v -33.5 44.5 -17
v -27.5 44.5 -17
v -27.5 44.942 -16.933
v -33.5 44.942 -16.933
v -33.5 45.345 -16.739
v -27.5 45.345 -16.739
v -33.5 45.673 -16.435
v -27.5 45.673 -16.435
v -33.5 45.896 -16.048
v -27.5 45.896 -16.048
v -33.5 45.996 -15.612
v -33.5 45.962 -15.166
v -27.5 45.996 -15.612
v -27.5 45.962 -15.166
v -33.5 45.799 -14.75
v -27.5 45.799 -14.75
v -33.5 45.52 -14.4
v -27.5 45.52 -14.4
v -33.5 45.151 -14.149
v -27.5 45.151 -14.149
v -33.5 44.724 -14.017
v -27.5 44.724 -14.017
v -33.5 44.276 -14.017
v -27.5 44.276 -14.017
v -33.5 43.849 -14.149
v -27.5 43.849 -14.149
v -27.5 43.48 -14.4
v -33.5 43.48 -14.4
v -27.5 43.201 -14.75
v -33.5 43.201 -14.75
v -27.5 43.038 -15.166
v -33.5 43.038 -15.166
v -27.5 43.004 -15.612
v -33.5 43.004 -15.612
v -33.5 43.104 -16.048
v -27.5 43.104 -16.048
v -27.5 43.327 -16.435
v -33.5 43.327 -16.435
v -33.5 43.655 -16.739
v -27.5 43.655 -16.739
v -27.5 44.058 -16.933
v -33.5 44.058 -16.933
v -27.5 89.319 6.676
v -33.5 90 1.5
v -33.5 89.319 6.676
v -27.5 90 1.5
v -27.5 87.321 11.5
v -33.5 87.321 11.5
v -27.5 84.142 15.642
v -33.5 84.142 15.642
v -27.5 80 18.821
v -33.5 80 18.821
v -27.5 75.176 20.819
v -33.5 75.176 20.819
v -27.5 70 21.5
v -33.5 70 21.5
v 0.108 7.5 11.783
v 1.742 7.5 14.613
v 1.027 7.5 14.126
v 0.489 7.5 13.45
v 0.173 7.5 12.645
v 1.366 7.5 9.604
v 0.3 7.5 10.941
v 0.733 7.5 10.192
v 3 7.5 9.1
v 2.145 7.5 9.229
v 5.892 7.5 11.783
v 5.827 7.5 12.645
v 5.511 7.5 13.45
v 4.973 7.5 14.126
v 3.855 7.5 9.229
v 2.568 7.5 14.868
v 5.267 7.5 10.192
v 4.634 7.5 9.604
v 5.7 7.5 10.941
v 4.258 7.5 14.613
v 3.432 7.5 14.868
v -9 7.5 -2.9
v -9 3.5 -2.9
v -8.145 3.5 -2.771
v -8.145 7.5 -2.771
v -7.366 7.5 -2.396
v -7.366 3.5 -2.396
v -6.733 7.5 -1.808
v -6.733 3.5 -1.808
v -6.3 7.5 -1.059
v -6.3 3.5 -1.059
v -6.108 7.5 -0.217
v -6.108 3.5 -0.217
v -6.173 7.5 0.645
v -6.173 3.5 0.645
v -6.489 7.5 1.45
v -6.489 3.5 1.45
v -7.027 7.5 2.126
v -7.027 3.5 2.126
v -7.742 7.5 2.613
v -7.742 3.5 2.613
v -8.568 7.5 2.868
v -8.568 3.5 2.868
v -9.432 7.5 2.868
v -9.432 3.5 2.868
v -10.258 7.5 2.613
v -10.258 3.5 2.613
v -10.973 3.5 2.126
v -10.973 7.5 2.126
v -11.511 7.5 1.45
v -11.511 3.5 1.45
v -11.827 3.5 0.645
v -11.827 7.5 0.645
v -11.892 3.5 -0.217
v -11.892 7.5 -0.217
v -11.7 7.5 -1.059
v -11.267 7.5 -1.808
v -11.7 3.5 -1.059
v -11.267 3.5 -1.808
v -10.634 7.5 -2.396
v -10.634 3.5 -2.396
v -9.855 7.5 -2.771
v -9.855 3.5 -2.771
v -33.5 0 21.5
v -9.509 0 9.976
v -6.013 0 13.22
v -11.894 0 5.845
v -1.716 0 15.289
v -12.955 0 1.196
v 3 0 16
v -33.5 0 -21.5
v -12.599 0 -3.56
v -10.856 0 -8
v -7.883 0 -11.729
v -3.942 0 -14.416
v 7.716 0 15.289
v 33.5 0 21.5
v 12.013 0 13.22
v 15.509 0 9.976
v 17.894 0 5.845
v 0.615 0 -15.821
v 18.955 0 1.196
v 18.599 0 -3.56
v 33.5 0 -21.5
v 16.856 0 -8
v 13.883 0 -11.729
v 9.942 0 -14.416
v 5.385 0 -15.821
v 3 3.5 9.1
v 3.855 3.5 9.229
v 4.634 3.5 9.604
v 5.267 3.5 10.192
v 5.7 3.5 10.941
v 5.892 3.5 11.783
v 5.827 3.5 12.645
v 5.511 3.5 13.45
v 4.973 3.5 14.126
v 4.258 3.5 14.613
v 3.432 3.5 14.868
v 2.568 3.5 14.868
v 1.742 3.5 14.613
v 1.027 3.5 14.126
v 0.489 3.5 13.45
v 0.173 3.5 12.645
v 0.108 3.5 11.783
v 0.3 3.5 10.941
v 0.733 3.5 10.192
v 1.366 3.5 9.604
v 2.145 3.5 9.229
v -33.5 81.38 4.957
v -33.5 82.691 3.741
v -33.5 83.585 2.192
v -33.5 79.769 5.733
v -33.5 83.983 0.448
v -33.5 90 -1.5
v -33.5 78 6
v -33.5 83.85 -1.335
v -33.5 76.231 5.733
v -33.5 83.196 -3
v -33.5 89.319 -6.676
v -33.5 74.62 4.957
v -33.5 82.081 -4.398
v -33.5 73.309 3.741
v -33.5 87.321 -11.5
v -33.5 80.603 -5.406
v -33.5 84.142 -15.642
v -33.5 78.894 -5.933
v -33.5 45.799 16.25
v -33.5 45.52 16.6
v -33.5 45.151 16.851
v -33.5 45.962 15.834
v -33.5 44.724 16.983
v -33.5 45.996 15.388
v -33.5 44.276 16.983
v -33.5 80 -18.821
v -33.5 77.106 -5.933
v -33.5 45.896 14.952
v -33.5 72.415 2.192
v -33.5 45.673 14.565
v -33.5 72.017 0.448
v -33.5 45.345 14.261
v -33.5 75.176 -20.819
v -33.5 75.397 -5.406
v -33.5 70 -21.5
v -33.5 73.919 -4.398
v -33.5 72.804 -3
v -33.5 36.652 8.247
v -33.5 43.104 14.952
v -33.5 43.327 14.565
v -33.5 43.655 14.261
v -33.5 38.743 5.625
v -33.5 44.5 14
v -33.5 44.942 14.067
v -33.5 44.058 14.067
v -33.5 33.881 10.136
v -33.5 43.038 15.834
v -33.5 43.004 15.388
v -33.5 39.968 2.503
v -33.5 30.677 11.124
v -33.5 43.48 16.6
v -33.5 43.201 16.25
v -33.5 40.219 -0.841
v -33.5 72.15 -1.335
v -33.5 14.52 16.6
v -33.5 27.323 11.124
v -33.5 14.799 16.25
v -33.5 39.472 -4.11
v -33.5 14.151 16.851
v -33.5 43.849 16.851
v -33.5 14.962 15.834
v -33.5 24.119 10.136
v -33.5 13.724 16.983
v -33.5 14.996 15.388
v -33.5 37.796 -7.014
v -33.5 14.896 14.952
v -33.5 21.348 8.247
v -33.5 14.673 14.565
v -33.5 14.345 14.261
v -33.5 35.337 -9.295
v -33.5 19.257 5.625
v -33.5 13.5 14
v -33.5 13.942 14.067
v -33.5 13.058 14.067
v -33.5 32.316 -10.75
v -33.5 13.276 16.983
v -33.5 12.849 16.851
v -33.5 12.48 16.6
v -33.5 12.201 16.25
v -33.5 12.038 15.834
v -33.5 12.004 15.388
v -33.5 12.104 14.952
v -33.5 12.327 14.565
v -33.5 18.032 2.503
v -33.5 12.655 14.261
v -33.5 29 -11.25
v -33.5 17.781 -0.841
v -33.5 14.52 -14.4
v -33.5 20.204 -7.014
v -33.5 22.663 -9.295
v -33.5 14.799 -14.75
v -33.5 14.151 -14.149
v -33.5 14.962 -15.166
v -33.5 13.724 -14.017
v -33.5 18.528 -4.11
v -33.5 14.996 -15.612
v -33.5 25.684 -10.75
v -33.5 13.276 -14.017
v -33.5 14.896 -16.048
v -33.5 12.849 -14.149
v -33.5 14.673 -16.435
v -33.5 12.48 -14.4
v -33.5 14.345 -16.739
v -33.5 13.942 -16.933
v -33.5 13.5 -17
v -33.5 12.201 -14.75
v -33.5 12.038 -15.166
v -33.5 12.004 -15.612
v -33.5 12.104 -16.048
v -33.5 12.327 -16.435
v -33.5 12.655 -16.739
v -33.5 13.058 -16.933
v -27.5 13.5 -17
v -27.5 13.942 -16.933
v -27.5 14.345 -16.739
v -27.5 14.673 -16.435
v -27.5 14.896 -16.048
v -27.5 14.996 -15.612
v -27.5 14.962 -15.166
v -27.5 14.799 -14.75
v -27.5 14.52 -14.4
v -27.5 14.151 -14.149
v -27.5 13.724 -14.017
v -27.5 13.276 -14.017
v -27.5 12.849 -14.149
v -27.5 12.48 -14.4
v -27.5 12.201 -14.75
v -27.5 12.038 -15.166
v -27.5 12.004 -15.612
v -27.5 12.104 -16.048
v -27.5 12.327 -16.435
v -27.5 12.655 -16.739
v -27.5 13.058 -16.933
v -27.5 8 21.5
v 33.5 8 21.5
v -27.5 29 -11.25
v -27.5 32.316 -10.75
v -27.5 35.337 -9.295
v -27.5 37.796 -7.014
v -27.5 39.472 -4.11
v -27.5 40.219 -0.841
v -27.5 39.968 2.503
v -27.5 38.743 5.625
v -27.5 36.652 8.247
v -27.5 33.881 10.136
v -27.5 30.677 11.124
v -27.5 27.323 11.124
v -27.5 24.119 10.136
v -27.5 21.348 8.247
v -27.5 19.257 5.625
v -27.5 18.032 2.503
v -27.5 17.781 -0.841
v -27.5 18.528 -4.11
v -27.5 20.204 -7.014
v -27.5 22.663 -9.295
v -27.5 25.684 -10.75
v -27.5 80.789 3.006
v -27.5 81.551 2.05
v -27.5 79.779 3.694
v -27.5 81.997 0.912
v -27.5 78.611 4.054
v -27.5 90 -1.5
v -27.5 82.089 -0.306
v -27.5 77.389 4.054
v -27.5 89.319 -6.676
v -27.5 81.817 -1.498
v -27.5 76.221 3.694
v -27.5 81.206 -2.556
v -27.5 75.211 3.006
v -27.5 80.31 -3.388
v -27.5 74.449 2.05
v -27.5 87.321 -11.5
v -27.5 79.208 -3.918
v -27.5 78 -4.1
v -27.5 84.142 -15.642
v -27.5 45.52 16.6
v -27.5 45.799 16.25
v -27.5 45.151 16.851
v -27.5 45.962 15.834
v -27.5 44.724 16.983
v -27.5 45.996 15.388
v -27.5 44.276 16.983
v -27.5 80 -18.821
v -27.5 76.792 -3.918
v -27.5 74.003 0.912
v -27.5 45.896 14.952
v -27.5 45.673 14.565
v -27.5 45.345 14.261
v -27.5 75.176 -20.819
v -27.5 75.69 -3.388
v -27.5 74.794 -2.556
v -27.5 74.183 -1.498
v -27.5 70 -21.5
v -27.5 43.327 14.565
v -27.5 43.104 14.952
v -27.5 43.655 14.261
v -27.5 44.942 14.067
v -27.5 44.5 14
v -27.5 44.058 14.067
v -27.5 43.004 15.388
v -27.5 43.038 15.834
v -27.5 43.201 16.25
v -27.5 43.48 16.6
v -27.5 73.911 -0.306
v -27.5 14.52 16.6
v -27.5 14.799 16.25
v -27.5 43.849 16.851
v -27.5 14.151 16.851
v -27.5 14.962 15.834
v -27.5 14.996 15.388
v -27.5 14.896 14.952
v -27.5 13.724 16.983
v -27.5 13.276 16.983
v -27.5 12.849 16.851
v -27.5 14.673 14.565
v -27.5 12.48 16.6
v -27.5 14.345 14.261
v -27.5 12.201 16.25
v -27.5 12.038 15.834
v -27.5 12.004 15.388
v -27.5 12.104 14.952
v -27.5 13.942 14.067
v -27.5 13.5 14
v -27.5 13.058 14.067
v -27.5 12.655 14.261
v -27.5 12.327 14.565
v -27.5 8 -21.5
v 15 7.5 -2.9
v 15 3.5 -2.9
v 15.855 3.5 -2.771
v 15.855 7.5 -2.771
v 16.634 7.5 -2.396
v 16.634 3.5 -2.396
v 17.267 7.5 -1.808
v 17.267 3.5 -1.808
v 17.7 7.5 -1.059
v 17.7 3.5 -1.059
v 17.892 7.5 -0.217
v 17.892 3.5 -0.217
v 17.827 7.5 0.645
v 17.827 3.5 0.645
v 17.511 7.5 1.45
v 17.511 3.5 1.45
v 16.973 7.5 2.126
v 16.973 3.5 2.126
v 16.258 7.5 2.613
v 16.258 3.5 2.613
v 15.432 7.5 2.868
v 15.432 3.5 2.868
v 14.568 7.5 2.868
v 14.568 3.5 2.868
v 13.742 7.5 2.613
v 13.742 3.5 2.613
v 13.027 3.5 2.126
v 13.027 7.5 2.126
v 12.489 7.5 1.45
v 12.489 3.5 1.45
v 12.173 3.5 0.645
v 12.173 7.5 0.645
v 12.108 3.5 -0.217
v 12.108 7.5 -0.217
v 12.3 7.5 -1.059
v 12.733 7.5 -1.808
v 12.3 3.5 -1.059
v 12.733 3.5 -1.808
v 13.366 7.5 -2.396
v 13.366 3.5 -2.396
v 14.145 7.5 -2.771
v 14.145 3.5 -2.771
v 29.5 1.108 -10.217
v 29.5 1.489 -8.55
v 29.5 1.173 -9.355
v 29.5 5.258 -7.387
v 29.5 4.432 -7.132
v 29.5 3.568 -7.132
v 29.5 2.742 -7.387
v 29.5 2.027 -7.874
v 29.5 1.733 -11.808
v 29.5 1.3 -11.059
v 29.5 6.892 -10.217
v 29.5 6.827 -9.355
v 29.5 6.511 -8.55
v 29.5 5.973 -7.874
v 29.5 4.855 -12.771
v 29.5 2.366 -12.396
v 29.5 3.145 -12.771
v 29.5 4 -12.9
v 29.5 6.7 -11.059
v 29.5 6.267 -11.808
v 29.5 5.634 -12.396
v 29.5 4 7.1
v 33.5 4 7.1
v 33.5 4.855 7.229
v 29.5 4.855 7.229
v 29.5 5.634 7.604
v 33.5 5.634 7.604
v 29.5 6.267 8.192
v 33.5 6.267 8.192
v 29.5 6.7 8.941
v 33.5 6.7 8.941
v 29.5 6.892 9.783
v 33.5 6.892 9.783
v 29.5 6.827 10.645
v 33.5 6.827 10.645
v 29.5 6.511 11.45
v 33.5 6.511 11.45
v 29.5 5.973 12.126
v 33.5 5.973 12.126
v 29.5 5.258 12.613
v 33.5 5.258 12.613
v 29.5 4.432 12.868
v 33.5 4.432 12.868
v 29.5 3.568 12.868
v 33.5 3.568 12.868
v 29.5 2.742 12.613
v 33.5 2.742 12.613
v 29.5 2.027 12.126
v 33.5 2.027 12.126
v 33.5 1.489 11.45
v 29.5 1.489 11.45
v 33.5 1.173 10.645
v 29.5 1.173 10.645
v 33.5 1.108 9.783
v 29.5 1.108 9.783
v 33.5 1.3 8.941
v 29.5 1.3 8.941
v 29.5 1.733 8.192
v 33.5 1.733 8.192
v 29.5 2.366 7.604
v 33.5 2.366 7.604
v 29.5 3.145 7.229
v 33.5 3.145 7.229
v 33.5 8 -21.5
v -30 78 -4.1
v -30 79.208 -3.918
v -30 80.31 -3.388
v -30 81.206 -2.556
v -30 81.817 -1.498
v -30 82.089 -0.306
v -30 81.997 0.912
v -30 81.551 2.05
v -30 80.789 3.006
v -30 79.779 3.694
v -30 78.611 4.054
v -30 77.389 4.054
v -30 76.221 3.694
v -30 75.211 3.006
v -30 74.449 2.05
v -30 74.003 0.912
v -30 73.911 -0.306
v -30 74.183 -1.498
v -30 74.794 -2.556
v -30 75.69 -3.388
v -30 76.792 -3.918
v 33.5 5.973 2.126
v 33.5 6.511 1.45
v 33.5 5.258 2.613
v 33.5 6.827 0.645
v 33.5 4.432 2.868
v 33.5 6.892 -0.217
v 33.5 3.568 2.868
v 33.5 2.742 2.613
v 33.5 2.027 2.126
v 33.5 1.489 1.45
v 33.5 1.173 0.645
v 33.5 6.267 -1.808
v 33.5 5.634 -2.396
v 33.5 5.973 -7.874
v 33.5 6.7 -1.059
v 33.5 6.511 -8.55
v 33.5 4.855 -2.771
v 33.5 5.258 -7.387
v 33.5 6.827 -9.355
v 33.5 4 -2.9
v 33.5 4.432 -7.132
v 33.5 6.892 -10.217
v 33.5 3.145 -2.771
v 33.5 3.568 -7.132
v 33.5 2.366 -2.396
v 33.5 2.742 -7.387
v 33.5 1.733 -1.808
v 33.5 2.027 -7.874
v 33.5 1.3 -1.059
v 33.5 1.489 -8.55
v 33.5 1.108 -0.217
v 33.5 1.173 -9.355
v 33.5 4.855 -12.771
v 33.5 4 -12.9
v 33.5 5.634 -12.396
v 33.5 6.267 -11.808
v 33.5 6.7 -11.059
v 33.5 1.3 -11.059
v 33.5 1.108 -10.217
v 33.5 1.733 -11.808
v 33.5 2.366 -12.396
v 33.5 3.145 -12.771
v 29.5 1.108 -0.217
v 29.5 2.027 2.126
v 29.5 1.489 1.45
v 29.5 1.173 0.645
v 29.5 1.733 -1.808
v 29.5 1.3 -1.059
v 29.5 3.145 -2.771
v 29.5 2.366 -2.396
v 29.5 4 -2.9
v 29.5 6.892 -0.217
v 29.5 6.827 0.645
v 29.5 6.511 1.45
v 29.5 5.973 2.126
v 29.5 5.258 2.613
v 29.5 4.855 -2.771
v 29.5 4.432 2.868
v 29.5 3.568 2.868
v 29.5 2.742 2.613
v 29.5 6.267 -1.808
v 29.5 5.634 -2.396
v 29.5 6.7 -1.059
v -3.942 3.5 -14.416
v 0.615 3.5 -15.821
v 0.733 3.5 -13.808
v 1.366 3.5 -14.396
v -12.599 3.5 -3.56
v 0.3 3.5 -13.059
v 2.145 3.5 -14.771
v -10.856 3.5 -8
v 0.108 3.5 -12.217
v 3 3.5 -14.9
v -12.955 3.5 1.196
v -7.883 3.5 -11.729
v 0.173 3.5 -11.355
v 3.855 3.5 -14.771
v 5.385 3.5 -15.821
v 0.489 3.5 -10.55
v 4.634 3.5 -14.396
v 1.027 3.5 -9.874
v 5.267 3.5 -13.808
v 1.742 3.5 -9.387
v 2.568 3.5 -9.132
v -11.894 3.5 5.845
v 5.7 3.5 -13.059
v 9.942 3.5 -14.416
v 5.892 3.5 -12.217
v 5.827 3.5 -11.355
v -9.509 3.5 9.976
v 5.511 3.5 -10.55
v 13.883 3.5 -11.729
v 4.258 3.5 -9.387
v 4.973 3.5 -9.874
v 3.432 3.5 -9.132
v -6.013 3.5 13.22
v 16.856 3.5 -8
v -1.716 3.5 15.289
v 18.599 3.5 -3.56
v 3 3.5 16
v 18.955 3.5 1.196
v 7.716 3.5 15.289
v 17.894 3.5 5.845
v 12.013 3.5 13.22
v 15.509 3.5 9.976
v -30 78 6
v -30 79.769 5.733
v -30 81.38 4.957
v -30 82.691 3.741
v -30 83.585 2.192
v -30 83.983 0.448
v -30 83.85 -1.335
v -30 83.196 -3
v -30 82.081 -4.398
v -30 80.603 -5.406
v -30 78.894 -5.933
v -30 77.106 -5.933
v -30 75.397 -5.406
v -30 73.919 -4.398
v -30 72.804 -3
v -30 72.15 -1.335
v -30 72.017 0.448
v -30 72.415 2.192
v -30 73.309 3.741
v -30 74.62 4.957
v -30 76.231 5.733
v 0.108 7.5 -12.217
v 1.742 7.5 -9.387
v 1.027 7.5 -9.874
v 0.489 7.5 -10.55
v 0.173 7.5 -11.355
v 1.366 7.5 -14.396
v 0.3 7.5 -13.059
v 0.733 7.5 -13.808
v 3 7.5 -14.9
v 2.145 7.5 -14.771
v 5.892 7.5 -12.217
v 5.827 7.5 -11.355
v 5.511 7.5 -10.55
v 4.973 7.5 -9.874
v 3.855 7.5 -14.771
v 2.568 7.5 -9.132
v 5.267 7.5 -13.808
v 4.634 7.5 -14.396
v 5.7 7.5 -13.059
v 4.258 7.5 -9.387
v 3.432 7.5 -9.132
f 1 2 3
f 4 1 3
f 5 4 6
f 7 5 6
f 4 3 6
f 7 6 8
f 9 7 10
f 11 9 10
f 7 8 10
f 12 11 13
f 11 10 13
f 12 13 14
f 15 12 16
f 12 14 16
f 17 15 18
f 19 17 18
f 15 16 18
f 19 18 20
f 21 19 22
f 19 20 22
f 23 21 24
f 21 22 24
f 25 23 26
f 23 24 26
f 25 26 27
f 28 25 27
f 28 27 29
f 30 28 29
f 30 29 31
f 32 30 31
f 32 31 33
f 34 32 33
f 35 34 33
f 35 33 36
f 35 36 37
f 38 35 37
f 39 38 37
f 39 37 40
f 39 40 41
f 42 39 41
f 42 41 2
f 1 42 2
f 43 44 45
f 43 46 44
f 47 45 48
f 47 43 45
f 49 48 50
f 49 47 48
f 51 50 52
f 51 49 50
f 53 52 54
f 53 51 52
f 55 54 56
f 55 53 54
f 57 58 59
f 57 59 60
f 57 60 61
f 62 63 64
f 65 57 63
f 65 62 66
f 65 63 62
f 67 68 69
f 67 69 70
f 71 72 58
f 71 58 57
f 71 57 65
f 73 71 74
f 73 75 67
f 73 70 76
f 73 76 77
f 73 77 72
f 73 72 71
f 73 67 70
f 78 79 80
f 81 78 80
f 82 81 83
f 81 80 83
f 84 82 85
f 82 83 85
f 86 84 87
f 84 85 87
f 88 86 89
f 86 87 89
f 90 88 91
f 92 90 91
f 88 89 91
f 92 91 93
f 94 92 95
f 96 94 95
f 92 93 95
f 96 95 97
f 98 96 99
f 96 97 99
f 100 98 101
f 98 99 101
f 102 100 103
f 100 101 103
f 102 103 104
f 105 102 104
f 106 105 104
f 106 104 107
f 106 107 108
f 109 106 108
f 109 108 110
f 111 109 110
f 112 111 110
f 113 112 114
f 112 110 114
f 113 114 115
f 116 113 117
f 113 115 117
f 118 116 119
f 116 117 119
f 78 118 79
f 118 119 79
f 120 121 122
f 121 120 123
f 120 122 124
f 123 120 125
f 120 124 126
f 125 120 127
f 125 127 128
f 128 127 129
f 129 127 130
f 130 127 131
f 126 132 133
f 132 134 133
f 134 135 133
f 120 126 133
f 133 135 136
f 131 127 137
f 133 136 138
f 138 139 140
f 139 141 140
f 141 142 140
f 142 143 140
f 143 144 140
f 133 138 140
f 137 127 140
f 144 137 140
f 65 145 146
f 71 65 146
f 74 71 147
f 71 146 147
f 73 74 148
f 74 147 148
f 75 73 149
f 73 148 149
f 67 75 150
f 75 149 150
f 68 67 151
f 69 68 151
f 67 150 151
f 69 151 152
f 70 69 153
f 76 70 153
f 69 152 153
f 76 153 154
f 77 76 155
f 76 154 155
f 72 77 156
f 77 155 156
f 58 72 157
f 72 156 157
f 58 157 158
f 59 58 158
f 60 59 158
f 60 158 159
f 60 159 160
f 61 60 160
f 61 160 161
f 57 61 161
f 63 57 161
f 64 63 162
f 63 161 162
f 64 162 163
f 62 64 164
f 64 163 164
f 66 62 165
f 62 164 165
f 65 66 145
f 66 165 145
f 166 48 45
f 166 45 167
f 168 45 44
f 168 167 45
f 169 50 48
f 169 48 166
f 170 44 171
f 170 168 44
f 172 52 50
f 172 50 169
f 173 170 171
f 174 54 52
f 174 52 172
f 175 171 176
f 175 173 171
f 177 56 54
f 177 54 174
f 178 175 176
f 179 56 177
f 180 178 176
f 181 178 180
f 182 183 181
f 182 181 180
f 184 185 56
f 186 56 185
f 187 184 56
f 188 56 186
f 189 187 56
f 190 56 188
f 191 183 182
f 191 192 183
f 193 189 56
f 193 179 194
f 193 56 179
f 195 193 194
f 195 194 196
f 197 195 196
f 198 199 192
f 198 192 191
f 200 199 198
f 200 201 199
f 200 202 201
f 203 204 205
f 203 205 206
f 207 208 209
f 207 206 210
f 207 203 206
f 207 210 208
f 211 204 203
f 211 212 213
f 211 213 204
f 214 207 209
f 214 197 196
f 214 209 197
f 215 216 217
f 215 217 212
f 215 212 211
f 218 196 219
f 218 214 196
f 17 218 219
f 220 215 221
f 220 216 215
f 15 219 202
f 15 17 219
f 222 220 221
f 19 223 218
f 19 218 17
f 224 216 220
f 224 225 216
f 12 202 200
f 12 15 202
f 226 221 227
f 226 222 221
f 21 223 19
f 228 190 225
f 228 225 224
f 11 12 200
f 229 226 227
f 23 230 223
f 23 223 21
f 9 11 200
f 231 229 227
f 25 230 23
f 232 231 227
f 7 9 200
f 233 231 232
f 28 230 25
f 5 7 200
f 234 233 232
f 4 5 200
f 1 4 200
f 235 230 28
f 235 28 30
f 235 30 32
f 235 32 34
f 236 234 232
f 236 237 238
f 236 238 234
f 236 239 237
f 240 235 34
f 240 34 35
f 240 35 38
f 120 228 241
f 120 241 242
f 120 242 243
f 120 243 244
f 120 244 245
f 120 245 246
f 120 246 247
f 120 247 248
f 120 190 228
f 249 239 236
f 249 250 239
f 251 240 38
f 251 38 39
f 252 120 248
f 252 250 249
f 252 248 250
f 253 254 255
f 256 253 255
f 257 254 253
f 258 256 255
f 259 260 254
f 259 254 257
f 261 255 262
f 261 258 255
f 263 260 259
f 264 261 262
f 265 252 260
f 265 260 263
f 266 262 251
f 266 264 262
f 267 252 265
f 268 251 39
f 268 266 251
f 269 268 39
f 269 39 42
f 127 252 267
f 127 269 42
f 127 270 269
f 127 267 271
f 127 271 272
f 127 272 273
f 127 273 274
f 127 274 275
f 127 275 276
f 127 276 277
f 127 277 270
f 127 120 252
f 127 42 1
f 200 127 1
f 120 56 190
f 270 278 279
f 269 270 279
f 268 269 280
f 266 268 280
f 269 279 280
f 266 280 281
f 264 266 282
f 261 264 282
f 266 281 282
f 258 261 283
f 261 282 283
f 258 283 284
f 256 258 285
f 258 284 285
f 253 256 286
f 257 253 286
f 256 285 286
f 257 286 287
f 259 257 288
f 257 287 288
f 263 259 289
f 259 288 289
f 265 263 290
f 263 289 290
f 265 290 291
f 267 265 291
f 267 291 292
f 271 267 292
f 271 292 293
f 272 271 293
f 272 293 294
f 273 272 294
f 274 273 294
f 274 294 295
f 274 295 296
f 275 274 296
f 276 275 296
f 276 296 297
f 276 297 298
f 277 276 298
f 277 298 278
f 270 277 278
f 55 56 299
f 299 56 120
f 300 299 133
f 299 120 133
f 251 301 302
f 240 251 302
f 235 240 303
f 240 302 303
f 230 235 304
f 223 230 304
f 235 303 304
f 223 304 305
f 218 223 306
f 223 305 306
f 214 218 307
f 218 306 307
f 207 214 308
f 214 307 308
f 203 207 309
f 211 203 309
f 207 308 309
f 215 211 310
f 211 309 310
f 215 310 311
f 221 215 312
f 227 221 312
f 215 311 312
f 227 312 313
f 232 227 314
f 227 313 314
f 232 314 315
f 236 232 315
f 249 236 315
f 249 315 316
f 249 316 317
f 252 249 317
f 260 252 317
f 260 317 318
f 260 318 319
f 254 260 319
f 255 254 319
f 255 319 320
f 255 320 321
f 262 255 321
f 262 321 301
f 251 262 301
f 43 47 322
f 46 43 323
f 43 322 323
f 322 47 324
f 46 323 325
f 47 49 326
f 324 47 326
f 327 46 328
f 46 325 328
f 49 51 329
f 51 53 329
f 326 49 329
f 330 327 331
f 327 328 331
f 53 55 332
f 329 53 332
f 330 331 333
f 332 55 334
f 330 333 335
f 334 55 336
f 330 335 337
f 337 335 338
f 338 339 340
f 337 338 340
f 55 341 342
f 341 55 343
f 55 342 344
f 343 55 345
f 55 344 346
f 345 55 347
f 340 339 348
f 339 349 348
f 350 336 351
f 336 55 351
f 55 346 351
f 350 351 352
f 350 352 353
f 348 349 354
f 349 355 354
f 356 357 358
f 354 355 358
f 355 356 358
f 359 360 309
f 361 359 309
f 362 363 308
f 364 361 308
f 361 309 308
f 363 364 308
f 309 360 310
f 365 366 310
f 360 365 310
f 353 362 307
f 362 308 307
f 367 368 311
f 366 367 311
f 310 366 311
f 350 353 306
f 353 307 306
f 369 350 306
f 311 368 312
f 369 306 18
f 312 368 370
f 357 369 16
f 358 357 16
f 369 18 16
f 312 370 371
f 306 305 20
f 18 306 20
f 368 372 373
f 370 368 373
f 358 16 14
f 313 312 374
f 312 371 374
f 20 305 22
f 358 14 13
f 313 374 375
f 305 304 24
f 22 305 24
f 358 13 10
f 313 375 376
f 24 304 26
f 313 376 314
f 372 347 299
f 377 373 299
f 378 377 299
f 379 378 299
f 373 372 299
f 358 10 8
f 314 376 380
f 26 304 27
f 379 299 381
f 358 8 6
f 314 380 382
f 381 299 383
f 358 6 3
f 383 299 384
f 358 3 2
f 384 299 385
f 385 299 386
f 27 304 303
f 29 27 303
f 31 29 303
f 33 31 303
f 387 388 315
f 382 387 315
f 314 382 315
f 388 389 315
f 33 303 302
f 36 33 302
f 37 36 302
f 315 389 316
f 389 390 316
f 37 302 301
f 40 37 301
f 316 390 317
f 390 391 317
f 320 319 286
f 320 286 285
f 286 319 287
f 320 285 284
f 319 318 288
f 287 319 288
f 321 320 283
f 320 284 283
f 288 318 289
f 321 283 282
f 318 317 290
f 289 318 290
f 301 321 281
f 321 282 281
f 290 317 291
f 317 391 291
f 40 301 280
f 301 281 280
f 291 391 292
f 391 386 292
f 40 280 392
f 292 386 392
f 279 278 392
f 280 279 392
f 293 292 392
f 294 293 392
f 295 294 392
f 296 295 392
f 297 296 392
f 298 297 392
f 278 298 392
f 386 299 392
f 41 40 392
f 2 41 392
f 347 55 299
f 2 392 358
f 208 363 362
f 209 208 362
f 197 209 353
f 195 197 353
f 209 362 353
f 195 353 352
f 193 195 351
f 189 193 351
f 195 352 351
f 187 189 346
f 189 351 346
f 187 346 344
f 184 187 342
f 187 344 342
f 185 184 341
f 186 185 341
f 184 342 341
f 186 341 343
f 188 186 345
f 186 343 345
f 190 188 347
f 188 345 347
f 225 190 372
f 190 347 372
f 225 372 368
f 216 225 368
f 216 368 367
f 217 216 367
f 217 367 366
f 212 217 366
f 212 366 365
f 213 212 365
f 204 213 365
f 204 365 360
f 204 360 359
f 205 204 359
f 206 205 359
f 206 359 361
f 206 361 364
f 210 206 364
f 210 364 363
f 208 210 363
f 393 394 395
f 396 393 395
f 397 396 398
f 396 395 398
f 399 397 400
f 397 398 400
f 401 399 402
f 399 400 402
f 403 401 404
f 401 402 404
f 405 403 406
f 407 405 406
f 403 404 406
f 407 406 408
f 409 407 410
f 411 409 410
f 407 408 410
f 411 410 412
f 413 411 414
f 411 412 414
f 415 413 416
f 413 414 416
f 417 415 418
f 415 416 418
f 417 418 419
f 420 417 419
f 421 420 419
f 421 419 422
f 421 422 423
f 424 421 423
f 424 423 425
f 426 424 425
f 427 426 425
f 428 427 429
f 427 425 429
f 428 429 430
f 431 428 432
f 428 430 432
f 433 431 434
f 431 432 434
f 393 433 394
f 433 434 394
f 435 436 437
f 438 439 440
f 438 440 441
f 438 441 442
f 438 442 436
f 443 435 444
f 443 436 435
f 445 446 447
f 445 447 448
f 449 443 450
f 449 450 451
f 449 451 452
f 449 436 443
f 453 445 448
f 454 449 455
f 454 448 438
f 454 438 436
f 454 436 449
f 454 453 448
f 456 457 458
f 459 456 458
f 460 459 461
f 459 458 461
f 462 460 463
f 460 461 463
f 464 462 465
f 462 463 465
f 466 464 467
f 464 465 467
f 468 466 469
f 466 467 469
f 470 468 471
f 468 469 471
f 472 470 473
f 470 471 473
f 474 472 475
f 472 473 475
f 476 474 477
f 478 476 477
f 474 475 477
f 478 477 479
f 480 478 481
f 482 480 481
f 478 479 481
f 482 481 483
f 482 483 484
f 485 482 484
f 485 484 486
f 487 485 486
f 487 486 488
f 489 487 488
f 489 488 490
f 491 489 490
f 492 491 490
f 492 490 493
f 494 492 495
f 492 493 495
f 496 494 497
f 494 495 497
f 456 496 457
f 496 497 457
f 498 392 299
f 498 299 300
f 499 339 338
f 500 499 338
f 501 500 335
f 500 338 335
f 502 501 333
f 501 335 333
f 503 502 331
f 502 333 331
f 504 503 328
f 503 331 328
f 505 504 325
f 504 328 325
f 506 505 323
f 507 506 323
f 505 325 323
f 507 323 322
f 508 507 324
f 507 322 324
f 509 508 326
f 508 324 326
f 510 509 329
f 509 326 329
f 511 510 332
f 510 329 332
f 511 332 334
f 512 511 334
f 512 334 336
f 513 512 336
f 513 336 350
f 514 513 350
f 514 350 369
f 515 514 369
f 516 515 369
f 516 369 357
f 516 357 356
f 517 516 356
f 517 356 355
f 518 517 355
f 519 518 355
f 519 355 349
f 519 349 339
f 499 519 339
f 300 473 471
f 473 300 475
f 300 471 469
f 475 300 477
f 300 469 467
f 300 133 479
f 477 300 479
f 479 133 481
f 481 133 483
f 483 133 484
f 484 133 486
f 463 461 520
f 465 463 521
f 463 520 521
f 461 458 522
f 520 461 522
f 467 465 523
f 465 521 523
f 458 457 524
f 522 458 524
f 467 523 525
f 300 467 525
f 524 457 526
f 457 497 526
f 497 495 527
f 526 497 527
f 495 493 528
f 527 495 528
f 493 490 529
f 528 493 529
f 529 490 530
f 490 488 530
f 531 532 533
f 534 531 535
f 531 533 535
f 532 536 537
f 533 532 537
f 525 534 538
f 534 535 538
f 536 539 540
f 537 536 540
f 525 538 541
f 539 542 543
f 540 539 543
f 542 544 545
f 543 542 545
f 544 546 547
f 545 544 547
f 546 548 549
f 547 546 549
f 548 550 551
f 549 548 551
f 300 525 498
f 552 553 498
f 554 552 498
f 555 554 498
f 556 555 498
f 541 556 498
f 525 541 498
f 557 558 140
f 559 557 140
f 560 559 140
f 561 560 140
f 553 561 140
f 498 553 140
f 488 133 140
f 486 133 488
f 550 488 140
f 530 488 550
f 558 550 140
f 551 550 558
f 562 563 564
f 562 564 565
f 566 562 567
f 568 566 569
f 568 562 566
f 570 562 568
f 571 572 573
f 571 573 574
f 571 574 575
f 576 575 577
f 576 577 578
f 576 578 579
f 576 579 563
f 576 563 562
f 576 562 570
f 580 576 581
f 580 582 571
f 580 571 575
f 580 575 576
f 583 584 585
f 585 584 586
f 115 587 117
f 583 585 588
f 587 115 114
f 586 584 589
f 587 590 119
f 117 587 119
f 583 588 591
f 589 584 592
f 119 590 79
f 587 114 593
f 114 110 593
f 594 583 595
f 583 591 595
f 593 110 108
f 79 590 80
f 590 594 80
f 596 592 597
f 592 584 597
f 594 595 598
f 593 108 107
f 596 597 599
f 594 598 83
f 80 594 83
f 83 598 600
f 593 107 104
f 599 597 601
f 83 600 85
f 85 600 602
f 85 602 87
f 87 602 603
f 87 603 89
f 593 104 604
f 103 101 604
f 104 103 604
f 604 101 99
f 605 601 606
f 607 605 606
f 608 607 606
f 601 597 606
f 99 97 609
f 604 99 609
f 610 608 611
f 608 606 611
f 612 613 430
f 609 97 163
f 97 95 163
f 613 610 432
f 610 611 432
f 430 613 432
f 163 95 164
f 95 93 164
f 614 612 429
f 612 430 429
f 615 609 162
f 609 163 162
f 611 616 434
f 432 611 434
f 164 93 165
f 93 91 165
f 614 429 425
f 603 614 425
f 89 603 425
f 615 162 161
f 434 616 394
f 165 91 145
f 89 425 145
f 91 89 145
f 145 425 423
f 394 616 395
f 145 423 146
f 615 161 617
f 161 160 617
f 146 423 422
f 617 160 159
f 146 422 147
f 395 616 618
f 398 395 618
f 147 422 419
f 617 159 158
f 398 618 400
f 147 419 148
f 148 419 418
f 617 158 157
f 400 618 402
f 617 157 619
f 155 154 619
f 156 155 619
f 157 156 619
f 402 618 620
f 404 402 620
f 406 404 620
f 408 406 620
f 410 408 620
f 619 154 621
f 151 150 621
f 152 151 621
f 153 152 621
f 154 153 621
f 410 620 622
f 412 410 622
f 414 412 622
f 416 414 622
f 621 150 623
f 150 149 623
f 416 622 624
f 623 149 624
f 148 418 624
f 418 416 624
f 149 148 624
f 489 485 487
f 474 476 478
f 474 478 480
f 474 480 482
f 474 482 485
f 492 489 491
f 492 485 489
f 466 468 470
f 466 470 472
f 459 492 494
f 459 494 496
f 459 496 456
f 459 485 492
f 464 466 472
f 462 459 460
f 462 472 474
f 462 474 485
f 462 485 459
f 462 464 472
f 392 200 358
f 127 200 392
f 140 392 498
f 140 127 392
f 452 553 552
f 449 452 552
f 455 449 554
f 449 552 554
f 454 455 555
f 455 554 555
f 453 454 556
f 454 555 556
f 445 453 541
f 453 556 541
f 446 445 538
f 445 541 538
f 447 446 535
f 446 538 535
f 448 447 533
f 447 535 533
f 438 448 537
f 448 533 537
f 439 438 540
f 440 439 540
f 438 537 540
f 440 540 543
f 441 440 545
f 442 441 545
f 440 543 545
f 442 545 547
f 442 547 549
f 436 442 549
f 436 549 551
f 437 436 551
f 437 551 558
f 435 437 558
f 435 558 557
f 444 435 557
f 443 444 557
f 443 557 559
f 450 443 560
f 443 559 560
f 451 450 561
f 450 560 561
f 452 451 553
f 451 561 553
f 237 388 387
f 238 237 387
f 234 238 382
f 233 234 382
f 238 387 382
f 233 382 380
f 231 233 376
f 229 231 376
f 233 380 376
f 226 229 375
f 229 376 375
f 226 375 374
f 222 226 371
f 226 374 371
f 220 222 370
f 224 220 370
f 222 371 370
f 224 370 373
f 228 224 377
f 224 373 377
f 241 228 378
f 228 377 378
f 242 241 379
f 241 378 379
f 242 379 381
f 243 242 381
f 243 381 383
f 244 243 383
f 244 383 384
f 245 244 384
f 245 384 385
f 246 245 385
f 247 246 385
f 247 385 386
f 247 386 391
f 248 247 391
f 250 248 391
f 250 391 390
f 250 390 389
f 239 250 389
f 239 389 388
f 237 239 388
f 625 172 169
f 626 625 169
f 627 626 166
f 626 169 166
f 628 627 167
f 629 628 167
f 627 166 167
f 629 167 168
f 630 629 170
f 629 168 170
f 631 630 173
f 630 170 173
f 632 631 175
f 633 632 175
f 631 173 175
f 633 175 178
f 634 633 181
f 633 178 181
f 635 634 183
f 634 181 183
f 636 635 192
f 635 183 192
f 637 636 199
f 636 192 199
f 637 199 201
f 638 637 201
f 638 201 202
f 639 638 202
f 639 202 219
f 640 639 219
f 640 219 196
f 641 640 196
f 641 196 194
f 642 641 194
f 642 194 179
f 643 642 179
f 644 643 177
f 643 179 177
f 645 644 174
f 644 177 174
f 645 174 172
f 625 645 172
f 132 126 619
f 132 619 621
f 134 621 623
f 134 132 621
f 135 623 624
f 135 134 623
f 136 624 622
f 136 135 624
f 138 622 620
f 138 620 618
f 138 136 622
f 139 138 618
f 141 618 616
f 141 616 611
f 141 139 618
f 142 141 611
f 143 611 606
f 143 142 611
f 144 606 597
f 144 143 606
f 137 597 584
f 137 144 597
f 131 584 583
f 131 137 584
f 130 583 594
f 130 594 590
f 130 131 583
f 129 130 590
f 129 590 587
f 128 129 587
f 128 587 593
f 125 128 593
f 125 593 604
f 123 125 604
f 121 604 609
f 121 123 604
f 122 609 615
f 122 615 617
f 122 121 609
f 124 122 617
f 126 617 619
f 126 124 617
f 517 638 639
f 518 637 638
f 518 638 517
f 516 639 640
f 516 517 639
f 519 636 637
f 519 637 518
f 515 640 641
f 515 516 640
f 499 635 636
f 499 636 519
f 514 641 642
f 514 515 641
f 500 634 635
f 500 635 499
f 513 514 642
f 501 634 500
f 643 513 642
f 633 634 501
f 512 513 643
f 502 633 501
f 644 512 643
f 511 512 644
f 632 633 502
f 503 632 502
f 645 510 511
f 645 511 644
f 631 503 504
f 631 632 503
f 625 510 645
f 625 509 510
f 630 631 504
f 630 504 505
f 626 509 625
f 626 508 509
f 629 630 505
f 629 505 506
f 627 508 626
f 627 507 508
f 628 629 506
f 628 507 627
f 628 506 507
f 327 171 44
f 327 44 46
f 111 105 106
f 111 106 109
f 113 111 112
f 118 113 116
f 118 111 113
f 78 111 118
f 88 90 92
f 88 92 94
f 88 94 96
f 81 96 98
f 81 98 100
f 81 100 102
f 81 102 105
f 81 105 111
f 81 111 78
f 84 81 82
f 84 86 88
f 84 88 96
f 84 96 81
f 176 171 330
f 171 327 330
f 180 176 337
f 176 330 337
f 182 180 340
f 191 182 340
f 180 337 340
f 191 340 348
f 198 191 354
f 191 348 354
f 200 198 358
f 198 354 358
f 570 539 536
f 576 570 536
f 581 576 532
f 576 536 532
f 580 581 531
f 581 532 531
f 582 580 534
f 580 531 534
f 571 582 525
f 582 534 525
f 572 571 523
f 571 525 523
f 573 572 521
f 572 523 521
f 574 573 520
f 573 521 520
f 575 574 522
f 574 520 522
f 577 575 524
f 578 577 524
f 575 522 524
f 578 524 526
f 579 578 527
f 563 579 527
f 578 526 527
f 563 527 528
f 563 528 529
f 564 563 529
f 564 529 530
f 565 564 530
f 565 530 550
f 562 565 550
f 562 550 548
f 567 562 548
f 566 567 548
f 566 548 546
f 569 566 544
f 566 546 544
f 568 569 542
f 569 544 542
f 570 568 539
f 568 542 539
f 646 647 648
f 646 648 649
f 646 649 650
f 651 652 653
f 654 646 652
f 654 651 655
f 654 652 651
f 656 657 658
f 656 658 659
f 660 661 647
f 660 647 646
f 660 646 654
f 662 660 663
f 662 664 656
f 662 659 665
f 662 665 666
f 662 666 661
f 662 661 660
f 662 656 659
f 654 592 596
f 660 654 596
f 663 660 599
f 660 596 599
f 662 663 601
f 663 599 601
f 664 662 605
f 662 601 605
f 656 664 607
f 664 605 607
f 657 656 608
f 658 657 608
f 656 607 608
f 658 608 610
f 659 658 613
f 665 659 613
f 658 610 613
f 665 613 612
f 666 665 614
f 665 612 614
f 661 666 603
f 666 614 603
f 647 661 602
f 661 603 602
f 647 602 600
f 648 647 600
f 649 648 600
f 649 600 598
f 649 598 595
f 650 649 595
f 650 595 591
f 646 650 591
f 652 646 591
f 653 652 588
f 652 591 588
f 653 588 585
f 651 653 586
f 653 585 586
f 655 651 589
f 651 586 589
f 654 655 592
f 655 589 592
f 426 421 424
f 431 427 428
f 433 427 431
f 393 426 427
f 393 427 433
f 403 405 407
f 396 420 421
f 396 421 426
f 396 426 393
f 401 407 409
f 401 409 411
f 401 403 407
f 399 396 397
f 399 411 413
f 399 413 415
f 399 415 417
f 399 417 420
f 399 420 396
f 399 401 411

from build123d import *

# Parameters (mm, degrees)
SKETCH1_W           = 67
SKETCH1_H           = 43
BOSS_EXTRUDE1_DEPTH = 8
SKETCH2_W           = 6
SKETCH2_H           = 43
BOSS_EXTRUDE2_DEPTH = 82
CUT_EXTRUDE1_REACH  = 112.83
SKETCH3_R           = 11.25
SKETCH3_R_2         = 1.5
CUT_EXTRUDE2_REACH  = 112.83
SKETCH4_R           = 4.1
FILLET1_R           = 20
SKETCH6_R           = 2.9
CUT_EXTRUDE4_DEPTH  = 4
SKETCH7_R           = 6
CUT_EXTRUDE5_DEPTH  = 3.5
CUT_EXTRUDE6_START  = -8
SKETCH8_R           = 16
CUT_EXTRUDE6_DEPTH  = 3.5
SKETCH9_R           = 2.9
CUT_EXTRUDE7_DEPTH  = 4


with BuildPart() as part:
    # Sketch1 → Boss-Extrude1 (new body)
    with BuildSketch(Plane(origin=(0, 0, 0), x_dir=(1, 0, 0), z_dir=(0, 1, 0))):
        Rectangle(SKETCH1_W, SKETCH1_H)
    extrude(amount=BOSS_EXTRUDE1_DEPTH)

    # Sketch2 → Boss-Extrude2 (add)
    with BuildSketch(Plane(origin=(0, 8, 0), x_dir=(1, 0, 0), z_dir=(0, 1, 0))):
        with Locations((-30.5, 0)):
            Rectangle(SKETCH2_W, SKETCH2_H)
    extrude(amount=BOSS_EXTRUDE2_DEPTH)

    # Sketch3 → Cut-Extrude1 (cut, up to next)
    with BuildSketch(Plane(origin=(-27.5, 0, 0), x_dir=(0, 0, -1), z_dir=(1, 0, 0)), mode=Mode.PRIVATE) as cut_extrude1_sk1:
        with Locations((0, 29)):
            Circle(SKETCH3_R)
    cut_extrude1_tool1 = extrude(cut_extrude1_sk1.sketch, amount=-CUT_EXTRUDE1_REACH, mode=Mode.PRIVATE) & part.part
    # Sketch3 → Cut-Extrude1 (cut, up to next)
    with BuildSketch(Plane(origin=(-27.5, 0, 0), x_dir=(0, 0, -1), z_dir=(1, 0, 0)), mode=Mode.PRIVATE) as cut_extrude1_sk2:
        with Locations((-15.5, 44.5)):
            Circle(SKETCH3_R_2)
    cut_extrude1_tool2 = extrude(cut_extrude1_sk2.sketch, amount=-CUT_EXTRUDE1_REACH, mode=Mode.PRIVATE) & part.part
    # Sketch3 → Cut-Extrude1 (cut, up to next)
    with BuildSketch(Plane(origin=(-27.5, 0, 0), x_dir=(0, 0, -1), z_dir=(1, 0, 0)), mode=Mode.PRIVATE) as cut_extrude1_sk3:
        with Locations((15.5, 44.5)):
            Circle(SKETCH3_R_2)
    cut_extrude1_tool3 = extrude(cut_extrude1_sk3.sketch, amount=-CUT_EXTRUDE1_REACH, mode=Mode.PRIVATE) & part.part
    # Sketch3 → Cut-Extrude1 (cut, up to next)
    with BuildSketch(Plane(origin=(-27.5, 0, 0), x_dir=(0, 0, -1), z_dir=(1, 0, 0)), mode=Mode.PRIVATE) as cut_extrude1_sk4:
        with Locations((15.5, 13.5)):
            Circle(SKETCH3_R_2)
    cut_extrude1_tool4 = extrude(cut_extrude1_sk4.sketch, amount=-CUT_EXTRUDE1_REACH, mode=Mode.PRIVATE) & part.part
    # Sketch3 → Cut-Extrude1 (cut, up to next)
    with BuildSketch(Plane(origin=(-27.5, 0, 0), x_dir=(0, 0, -1), z_dir=(1, 0, 0)), mode=Mode.PRIVATE) as cut_extrude1_sk5:
        with Locations((-15.5, 13.5)):
            Circle(SKETCH3_R_2)
    cut_extrude1_tool5 = extrude(cut_extrude1_sk5.sketch, amount=-CUT_EXTRUDE1_REACH, mode=Mode.PRIVATE) & part.part
    add(cut_extrude1_tool1.solids().sort_by_distance((-27.5, 29, 0))[0], mode=Mode.SUBTRACT)
    add(cut_extrude1_tool2.solids().sort_by_distance((-27.5, 44.5, 15.5))[0], mode=Mode.SUBTRACT)
    add(cut_extrude1_tool3.solids().sort_by_distance((-27.5, 44.5, -15.5))[0], mode=Mode.SUBTRACT)
    add(cut_extrude1_tool4.solids().sort_by_distance((-27.5, 13.5, -15.5))[0], mode=Mode.SUBTRACT)
    add(cut_extrude1_tool5.solids().sort_by_distance((-27.5, 13.5, 15.5))[0], mode=Mode.SUBTRACT)

    # Sketch4 → Cut-Extrude2 (cut, up to next)
    with BuildSketch(Plane(origin=(-27.5, 0, 0), x_dir=(0, 0, -1), z_dir=(1, 0, 0)), mode=Mode.PRIVATE) as cut_extrude2_sk1:
        with Locations((0, 78)):
            Circle(SKETCH4_R)
    cut_extrude2_tool1 = extrude(cut_extrude2_sk1.sketch, amount=-CUT_EXTRUDE2_REACH, mode=Mode.PRIVATE) & part.part
    add(cut_extrude2_tool1.solids().sort_by_distance((-27.5, 78, 0))[0], mode=Mode.SUBTRACT)

    # Fillet1
    fillet1_edges = [part.edges().sort_by_distance(p)[0] for p in [
        (-30.5, 90, -21.5),
        (-30.5, 90, 21.5),
    ]]
    fillet(fillet1_edges, radius=FILLET1_R)

    # Sketch6 → Cut-Extrude4 (cut)
    with BuildSketch(Plane(origin=(33.5, 0, 0), x_dir=(0, 0, -1), z_dir=(1, 0, 0))):
        with Locations((0, 4)):
            Circle(SKETCH6_R)
        with Locations((10, 4)):
            Circle(SKETCH6_R)
        with Locations((-10, 4)):
            Circle(SKETCH6_R)
    extrude(amount=-CUT_EXTRUDE4_DEPTH, mode=Mode.SUBTRACT)

    # Sketch7 → Cut-Extrude5 (cut)
    with BuildSketch(Plane.ZY.offset(33.5)):
        with Locations((0, 78)):
            Circle(SKETCH7_R)
    extrude(amount=-CUT_EXTRUDE5_DEPTH, mode=Mode.SUBTRACT)

    # Sketch8 → Cut-Extrude6 (cut)
    with BuildSketch(Plane(origin=(0, 8, 0), x_dir=(1, 0, 0), z_dir=(0, 1, 0)).offset(CUT_EXTRUDE6_START)):
        with Locations(Location((3, 0, 0), (0, 0, 270))):
            Circle(SKETCH8_R)
    extrude(amount=CUT_EXTRUDE6_DEPTH, mode=Mode.SUBTRACT)

    # Sketch9 → Cut-Extrude7 (cut)
    with BuildSketch(Plane.XZ.offset(-3.5)):
        with Locations(Location((3, 12, 0), (0, 0, 270))):
            Circle(SKETCH9_R)
        with Locations(Location((15, 0, 0), (0, 0, 270))):
            Circle(SKETCH9_R)
        with Locations(Location((3, -12, 0), (0, 0, 270))):
            Circle(SKETCH9_R)
        with Locations(Location((-9, 0, 0), (0, 0, 270))):
            Circle(SKETCH9_R)
    extrude(amount=-CUT_EXTRUDE7_DEPTH, mode=Mode.SUBTRACT)


solid = part.part
